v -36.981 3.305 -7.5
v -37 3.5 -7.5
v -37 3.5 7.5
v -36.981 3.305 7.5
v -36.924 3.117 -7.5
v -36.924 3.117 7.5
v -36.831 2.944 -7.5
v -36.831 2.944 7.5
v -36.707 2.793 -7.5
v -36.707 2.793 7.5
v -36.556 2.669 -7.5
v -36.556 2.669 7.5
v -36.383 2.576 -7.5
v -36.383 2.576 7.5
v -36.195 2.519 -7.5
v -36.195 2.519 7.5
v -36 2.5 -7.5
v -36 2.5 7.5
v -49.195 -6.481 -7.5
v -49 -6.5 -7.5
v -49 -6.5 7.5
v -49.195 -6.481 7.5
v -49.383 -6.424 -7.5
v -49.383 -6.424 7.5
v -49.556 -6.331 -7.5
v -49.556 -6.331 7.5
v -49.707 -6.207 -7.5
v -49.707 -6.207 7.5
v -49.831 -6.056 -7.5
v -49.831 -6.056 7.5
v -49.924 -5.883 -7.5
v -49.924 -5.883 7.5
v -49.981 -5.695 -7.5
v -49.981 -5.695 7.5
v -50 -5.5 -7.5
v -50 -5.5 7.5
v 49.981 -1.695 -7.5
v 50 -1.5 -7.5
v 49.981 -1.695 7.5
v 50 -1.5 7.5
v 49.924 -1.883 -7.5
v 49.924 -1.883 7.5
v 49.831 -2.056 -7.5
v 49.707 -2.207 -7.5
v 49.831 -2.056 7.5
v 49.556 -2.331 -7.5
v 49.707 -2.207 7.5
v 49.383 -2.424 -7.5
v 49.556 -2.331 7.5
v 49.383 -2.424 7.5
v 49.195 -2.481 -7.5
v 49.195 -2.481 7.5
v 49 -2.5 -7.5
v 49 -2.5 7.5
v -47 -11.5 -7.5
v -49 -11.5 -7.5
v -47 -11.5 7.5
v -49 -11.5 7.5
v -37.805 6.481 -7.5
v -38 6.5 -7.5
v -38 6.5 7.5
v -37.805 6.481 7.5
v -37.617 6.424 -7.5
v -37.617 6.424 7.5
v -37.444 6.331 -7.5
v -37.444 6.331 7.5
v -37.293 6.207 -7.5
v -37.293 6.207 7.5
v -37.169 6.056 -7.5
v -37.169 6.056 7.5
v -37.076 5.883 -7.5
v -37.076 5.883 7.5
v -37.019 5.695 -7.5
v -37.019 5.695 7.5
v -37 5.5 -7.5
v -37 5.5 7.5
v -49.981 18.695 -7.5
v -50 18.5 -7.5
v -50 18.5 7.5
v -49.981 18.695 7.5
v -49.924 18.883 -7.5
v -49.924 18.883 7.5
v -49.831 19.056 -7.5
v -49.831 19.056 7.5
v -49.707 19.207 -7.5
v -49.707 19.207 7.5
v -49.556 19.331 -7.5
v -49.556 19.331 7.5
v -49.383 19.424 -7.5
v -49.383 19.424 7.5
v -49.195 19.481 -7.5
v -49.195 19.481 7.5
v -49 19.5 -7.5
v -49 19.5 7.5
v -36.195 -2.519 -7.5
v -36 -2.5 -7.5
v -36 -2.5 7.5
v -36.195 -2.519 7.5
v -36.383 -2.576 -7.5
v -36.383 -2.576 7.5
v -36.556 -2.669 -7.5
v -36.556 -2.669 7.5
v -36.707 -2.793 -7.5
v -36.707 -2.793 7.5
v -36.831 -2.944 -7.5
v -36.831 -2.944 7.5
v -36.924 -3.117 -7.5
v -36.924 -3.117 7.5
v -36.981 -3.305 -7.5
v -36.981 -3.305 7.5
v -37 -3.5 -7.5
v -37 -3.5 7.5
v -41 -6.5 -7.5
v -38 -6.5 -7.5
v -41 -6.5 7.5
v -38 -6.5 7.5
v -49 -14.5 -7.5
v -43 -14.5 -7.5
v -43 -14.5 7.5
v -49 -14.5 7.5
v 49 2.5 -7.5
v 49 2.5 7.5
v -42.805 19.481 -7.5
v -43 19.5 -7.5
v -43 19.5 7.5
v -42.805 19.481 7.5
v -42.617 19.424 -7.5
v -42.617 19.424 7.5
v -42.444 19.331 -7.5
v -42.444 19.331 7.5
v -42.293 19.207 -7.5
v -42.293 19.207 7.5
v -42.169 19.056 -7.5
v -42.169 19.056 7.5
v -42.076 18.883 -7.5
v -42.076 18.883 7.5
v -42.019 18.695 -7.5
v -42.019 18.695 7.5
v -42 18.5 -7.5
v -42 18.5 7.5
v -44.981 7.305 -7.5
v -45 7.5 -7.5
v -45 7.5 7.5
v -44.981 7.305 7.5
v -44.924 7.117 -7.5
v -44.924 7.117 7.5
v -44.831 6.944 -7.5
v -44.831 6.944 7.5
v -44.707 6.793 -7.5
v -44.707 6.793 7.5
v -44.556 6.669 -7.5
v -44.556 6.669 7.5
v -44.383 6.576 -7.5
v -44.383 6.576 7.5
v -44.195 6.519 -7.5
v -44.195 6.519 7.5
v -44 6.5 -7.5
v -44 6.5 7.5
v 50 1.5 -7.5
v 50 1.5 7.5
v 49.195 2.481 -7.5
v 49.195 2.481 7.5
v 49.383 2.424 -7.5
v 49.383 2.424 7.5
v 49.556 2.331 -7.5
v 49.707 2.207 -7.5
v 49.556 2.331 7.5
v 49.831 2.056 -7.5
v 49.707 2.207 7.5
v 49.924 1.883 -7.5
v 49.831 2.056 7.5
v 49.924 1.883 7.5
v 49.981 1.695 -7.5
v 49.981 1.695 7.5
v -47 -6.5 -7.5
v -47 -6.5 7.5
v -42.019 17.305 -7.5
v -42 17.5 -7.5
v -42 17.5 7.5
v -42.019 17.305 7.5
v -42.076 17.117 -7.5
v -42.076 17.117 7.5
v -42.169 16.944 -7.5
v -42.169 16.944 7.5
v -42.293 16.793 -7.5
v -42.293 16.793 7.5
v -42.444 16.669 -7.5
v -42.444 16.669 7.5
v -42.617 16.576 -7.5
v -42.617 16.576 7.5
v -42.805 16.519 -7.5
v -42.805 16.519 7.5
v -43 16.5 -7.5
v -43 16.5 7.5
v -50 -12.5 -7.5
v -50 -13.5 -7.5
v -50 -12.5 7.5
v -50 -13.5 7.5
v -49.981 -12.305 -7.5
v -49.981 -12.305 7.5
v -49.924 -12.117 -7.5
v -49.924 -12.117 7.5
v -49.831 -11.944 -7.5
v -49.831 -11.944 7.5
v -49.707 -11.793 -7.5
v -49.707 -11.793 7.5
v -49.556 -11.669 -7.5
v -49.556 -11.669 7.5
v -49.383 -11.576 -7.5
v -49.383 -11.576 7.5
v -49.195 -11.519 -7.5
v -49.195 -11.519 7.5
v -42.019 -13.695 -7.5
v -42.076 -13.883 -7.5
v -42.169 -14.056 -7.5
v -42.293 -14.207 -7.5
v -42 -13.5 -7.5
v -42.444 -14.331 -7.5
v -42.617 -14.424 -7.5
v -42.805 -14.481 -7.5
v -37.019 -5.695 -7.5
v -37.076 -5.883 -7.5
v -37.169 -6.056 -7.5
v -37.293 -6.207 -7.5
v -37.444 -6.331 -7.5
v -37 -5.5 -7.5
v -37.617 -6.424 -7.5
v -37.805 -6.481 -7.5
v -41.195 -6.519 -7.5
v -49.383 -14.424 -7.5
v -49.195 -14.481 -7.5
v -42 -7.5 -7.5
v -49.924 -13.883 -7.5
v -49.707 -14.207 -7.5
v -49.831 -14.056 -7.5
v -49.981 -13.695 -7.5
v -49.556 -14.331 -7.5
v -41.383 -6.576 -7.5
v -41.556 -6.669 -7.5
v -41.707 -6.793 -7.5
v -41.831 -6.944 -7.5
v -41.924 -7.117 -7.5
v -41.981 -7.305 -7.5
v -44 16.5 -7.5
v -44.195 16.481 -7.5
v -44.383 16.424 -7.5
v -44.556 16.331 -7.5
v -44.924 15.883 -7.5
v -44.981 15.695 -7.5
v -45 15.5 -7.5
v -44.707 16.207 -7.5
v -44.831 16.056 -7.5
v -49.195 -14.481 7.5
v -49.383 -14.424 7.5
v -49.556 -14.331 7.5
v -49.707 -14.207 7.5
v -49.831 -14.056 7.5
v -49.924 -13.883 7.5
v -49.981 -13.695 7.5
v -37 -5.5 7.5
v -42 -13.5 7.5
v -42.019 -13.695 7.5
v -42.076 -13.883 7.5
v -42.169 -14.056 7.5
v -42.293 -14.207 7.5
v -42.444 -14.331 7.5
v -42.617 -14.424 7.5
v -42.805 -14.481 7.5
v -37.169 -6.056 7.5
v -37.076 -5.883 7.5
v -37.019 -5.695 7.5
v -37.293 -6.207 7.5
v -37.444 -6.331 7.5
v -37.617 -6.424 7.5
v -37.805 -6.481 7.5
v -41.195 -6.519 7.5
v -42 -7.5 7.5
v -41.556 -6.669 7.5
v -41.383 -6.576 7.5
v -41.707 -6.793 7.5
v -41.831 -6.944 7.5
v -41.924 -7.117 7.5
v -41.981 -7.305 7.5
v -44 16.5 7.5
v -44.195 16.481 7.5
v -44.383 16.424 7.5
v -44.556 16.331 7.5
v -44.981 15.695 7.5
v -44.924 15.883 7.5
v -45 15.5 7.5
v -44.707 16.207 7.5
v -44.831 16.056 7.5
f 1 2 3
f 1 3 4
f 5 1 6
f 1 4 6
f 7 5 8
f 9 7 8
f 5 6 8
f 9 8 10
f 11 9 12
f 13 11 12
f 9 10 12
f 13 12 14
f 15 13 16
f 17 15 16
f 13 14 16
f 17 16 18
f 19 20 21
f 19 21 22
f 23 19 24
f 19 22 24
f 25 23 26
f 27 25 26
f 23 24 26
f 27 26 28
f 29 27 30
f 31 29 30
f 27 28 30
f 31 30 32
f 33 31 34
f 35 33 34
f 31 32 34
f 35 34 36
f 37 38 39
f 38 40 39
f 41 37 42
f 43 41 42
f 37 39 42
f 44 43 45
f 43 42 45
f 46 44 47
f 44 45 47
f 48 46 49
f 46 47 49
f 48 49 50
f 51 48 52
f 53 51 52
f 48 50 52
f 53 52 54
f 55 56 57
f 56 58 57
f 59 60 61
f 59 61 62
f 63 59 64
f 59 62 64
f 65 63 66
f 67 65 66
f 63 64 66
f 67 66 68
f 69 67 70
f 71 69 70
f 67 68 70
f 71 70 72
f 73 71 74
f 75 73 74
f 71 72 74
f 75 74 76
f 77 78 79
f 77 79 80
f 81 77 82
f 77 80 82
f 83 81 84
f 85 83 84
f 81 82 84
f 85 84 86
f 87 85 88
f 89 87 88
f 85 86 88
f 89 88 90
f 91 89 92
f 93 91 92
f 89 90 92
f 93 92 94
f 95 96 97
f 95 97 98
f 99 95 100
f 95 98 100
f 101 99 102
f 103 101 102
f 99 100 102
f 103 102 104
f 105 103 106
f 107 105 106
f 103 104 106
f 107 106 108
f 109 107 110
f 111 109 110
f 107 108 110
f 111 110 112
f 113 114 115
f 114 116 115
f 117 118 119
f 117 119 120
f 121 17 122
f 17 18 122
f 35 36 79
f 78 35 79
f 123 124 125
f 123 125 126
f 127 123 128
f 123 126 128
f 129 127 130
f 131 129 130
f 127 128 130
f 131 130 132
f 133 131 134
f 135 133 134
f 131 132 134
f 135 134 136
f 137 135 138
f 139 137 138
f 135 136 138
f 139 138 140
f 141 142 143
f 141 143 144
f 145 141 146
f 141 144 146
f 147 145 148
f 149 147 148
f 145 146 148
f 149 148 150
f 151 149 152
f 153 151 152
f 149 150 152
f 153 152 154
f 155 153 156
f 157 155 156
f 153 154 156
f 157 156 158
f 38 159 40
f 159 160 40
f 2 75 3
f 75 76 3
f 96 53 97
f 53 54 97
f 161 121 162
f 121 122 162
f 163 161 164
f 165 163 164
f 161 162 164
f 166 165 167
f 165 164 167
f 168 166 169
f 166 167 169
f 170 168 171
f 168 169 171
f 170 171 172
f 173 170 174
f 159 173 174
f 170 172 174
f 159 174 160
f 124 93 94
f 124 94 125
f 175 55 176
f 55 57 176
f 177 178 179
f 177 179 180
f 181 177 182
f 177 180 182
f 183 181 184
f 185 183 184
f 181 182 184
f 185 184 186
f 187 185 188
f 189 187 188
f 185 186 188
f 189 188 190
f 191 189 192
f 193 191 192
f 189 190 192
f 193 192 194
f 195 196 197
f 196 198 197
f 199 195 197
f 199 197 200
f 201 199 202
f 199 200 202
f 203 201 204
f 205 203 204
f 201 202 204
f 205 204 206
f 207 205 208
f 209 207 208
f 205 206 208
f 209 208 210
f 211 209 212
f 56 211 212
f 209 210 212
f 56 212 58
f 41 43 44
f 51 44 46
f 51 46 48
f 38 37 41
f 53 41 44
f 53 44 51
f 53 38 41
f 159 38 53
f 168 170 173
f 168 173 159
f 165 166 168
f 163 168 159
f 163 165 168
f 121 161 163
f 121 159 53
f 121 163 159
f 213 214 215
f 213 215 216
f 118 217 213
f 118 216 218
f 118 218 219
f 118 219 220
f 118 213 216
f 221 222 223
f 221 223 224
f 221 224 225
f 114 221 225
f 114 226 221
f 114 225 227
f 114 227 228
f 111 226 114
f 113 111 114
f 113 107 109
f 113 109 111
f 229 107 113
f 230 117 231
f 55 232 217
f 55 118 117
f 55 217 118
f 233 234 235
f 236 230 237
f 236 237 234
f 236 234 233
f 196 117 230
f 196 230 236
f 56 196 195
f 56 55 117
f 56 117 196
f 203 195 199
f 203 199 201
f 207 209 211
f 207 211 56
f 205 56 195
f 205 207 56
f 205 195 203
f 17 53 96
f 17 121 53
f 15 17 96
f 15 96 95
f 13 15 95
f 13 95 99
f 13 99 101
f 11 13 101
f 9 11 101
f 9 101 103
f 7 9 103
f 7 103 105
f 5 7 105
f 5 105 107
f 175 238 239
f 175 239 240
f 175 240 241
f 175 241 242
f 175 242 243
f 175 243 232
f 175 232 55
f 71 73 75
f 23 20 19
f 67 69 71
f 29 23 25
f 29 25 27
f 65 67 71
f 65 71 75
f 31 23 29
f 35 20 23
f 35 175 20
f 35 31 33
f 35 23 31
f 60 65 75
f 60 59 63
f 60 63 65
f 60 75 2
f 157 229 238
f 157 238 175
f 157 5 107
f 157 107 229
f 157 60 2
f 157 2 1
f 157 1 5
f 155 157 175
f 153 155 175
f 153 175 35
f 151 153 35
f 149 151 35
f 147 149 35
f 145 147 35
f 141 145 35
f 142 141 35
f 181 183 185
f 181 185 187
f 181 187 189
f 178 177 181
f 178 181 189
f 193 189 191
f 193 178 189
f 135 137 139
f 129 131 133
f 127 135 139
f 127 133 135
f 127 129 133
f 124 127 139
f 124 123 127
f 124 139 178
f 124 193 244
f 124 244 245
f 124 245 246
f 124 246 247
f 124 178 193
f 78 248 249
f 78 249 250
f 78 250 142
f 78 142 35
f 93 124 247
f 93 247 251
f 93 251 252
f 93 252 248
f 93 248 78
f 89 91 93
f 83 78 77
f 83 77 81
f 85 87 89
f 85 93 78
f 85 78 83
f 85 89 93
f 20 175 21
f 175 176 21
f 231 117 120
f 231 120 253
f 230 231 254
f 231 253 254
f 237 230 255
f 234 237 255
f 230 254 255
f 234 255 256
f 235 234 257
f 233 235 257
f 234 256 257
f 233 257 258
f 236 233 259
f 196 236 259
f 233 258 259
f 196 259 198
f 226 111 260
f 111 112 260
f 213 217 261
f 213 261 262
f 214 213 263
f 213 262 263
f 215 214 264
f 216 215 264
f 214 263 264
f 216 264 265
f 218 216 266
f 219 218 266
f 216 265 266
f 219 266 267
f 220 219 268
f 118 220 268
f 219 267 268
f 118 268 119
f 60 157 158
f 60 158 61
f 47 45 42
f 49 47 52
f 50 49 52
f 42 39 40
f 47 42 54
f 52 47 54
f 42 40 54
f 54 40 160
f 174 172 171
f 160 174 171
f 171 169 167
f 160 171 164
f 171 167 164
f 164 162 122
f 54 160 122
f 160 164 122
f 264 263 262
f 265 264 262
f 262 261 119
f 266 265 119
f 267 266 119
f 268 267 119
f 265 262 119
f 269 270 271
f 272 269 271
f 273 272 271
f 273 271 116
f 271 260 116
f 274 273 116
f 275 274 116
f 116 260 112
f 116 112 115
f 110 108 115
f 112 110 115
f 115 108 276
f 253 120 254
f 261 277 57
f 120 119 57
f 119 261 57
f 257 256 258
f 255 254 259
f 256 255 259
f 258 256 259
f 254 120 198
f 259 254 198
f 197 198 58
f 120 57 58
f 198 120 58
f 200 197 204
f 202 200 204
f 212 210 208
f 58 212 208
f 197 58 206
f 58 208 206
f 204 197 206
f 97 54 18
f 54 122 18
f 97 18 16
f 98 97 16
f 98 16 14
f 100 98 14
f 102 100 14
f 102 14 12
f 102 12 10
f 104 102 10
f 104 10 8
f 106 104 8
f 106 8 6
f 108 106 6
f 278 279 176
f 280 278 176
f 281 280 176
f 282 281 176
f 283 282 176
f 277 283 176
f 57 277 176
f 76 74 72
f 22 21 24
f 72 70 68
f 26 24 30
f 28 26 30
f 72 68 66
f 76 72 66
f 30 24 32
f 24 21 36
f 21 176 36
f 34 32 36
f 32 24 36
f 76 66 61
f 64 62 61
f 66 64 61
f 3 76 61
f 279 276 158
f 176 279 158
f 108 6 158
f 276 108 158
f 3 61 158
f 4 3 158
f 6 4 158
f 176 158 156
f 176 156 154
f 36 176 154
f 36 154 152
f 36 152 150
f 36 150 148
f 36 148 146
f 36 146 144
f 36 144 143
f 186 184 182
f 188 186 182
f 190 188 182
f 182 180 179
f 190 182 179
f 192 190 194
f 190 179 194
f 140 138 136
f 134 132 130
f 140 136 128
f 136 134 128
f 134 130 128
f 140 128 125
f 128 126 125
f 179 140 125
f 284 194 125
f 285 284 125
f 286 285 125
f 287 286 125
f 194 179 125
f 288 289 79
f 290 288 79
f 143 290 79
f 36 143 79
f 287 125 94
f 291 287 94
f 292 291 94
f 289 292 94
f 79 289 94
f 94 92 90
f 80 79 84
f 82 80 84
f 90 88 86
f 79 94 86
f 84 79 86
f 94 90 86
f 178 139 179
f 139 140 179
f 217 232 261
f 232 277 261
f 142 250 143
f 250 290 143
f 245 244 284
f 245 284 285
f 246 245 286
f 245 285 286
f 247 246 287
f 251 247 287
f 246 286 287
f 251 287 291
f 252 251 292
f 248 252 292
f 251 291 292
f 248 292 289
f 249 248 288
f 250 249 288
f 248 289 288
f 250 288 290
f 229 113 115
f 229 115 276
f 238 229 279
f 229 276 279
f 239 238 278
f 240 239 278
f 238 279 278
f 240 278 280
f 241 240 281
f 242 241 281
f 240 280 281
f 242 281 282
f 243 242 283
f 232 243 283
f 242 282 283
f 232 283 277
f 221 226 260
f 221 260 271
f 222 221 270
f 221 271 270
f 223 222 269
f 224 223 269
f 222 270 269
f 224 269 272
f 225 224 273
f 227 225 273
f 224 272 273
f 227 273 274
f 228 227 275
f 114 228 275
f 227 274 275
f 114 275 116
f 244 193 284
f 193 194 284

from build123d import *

# Parameters (mm, degrees)
BOSS_EXTRUDE1_DEPTH = 7.5


with BuildPart() as part:
    # Sketch1 → Boss-Extrude1 (new, symmetric)
    with BuildSketch(Plane.XY):
        with BuildLine():
            Line((-50, 2.5), (-50, 18.5))
            ThreePointArc((-50, 18.5), (-49.707106781, 19.207106781), (-49, 19.5))
            Line((-49, 19.5), (-45, 19.5))
            Line((-45, 19.5), (-43, 19.5))
            ThreePointArc((-43, 19.5), (-42.292893219, 19.207106781), (-42, 18.5))
            Line((-42, 18.5), (-42, 17.5))
            ThreePointArc((-42, 17.5), (-42.292893219, 16.792893219), (-43, 16.5))
            Line((-43, 16.5), (-44, 16.5))
            ThreePointArc((-44, 16.5), (-44.707106781, 16.207106781), (-45, 15.5))
            Line((-45, 15.5), (-45, 7.5))
            ThreePointArc((-45, 7.5), (-44.707106781, 6.792893219), (-44, 6.5))
            Line((-44, 6.5), (-38, 6.5))
            ThreePointArc((-38, 6.5), (-37.292893219, 6.207106781), (-37, 5.5))
            Line((-37, 5.5), (-37, 3.5))
            ThreePointArc((-37, 3.5), (-36.707106781, 2.792893219), (-36, 2.5))
            Line((-36, 2.5), (49, 2.5))
            ThreePointArc((49, 2.5), (49.707106781, 2.207106781), (50, 1.5))
            Line((50, 1.5), (50, -1.5))
            ThreePointArc((50, -1.5), (49.707106781, -2.207106781), (49, -2.5))
            Line((49, -2.5), (-36, -2.5))
            ThreePointArc((-36, -2.5), (-36.707106781, -2.792893219), (-37, -3.5))
            Line((-37, -3.5), (-37, -5.5))
            ThreePointArc((-37, -5.5), (-37.292893219, -6.207106781), (-38, -6.5))
            Line((-38, -6.5), (-41, -6.5))
            ThreePointArc((-41, -6.5), (-41.707106781, -6.792893219), (-42, -7.5))
            Line((-42, -7.5), (-42, -13.5))
            ThreePointArc((-42, -13.5), (-42.292893219, -14.207106781), (-43, -14.5))
            Line((-43, -14.5), (-49, -14.5))
            ThreePointArc((-49, -14.5), (-49.707106781, -14.207106781), (-50, -13.5))
            Line((-50, -13.5), (-50, -12.5))
            ThreePointArc((-50, -12.5), (-49.707106781, -11.792893219), (-49, -11.5))
            Line((-49, -11.5), (-47, -11.5))
            Line((-47, -11.5), (-47, -6.5))
            Line((-47, -6.5), (-49, -6.5))
            ThreePointArc((-49, -6.5), (-49.707106781, -6.207106781), (-50, -5.5))
            Line((-50, -5.5), (-50, -2.5))
            Line((-50, -2.5), (-50, 2.5))
        make_face()
    extrude(amount=BOSS_EXTRUDE1_DEPTH, both=True)


solid = part.part
